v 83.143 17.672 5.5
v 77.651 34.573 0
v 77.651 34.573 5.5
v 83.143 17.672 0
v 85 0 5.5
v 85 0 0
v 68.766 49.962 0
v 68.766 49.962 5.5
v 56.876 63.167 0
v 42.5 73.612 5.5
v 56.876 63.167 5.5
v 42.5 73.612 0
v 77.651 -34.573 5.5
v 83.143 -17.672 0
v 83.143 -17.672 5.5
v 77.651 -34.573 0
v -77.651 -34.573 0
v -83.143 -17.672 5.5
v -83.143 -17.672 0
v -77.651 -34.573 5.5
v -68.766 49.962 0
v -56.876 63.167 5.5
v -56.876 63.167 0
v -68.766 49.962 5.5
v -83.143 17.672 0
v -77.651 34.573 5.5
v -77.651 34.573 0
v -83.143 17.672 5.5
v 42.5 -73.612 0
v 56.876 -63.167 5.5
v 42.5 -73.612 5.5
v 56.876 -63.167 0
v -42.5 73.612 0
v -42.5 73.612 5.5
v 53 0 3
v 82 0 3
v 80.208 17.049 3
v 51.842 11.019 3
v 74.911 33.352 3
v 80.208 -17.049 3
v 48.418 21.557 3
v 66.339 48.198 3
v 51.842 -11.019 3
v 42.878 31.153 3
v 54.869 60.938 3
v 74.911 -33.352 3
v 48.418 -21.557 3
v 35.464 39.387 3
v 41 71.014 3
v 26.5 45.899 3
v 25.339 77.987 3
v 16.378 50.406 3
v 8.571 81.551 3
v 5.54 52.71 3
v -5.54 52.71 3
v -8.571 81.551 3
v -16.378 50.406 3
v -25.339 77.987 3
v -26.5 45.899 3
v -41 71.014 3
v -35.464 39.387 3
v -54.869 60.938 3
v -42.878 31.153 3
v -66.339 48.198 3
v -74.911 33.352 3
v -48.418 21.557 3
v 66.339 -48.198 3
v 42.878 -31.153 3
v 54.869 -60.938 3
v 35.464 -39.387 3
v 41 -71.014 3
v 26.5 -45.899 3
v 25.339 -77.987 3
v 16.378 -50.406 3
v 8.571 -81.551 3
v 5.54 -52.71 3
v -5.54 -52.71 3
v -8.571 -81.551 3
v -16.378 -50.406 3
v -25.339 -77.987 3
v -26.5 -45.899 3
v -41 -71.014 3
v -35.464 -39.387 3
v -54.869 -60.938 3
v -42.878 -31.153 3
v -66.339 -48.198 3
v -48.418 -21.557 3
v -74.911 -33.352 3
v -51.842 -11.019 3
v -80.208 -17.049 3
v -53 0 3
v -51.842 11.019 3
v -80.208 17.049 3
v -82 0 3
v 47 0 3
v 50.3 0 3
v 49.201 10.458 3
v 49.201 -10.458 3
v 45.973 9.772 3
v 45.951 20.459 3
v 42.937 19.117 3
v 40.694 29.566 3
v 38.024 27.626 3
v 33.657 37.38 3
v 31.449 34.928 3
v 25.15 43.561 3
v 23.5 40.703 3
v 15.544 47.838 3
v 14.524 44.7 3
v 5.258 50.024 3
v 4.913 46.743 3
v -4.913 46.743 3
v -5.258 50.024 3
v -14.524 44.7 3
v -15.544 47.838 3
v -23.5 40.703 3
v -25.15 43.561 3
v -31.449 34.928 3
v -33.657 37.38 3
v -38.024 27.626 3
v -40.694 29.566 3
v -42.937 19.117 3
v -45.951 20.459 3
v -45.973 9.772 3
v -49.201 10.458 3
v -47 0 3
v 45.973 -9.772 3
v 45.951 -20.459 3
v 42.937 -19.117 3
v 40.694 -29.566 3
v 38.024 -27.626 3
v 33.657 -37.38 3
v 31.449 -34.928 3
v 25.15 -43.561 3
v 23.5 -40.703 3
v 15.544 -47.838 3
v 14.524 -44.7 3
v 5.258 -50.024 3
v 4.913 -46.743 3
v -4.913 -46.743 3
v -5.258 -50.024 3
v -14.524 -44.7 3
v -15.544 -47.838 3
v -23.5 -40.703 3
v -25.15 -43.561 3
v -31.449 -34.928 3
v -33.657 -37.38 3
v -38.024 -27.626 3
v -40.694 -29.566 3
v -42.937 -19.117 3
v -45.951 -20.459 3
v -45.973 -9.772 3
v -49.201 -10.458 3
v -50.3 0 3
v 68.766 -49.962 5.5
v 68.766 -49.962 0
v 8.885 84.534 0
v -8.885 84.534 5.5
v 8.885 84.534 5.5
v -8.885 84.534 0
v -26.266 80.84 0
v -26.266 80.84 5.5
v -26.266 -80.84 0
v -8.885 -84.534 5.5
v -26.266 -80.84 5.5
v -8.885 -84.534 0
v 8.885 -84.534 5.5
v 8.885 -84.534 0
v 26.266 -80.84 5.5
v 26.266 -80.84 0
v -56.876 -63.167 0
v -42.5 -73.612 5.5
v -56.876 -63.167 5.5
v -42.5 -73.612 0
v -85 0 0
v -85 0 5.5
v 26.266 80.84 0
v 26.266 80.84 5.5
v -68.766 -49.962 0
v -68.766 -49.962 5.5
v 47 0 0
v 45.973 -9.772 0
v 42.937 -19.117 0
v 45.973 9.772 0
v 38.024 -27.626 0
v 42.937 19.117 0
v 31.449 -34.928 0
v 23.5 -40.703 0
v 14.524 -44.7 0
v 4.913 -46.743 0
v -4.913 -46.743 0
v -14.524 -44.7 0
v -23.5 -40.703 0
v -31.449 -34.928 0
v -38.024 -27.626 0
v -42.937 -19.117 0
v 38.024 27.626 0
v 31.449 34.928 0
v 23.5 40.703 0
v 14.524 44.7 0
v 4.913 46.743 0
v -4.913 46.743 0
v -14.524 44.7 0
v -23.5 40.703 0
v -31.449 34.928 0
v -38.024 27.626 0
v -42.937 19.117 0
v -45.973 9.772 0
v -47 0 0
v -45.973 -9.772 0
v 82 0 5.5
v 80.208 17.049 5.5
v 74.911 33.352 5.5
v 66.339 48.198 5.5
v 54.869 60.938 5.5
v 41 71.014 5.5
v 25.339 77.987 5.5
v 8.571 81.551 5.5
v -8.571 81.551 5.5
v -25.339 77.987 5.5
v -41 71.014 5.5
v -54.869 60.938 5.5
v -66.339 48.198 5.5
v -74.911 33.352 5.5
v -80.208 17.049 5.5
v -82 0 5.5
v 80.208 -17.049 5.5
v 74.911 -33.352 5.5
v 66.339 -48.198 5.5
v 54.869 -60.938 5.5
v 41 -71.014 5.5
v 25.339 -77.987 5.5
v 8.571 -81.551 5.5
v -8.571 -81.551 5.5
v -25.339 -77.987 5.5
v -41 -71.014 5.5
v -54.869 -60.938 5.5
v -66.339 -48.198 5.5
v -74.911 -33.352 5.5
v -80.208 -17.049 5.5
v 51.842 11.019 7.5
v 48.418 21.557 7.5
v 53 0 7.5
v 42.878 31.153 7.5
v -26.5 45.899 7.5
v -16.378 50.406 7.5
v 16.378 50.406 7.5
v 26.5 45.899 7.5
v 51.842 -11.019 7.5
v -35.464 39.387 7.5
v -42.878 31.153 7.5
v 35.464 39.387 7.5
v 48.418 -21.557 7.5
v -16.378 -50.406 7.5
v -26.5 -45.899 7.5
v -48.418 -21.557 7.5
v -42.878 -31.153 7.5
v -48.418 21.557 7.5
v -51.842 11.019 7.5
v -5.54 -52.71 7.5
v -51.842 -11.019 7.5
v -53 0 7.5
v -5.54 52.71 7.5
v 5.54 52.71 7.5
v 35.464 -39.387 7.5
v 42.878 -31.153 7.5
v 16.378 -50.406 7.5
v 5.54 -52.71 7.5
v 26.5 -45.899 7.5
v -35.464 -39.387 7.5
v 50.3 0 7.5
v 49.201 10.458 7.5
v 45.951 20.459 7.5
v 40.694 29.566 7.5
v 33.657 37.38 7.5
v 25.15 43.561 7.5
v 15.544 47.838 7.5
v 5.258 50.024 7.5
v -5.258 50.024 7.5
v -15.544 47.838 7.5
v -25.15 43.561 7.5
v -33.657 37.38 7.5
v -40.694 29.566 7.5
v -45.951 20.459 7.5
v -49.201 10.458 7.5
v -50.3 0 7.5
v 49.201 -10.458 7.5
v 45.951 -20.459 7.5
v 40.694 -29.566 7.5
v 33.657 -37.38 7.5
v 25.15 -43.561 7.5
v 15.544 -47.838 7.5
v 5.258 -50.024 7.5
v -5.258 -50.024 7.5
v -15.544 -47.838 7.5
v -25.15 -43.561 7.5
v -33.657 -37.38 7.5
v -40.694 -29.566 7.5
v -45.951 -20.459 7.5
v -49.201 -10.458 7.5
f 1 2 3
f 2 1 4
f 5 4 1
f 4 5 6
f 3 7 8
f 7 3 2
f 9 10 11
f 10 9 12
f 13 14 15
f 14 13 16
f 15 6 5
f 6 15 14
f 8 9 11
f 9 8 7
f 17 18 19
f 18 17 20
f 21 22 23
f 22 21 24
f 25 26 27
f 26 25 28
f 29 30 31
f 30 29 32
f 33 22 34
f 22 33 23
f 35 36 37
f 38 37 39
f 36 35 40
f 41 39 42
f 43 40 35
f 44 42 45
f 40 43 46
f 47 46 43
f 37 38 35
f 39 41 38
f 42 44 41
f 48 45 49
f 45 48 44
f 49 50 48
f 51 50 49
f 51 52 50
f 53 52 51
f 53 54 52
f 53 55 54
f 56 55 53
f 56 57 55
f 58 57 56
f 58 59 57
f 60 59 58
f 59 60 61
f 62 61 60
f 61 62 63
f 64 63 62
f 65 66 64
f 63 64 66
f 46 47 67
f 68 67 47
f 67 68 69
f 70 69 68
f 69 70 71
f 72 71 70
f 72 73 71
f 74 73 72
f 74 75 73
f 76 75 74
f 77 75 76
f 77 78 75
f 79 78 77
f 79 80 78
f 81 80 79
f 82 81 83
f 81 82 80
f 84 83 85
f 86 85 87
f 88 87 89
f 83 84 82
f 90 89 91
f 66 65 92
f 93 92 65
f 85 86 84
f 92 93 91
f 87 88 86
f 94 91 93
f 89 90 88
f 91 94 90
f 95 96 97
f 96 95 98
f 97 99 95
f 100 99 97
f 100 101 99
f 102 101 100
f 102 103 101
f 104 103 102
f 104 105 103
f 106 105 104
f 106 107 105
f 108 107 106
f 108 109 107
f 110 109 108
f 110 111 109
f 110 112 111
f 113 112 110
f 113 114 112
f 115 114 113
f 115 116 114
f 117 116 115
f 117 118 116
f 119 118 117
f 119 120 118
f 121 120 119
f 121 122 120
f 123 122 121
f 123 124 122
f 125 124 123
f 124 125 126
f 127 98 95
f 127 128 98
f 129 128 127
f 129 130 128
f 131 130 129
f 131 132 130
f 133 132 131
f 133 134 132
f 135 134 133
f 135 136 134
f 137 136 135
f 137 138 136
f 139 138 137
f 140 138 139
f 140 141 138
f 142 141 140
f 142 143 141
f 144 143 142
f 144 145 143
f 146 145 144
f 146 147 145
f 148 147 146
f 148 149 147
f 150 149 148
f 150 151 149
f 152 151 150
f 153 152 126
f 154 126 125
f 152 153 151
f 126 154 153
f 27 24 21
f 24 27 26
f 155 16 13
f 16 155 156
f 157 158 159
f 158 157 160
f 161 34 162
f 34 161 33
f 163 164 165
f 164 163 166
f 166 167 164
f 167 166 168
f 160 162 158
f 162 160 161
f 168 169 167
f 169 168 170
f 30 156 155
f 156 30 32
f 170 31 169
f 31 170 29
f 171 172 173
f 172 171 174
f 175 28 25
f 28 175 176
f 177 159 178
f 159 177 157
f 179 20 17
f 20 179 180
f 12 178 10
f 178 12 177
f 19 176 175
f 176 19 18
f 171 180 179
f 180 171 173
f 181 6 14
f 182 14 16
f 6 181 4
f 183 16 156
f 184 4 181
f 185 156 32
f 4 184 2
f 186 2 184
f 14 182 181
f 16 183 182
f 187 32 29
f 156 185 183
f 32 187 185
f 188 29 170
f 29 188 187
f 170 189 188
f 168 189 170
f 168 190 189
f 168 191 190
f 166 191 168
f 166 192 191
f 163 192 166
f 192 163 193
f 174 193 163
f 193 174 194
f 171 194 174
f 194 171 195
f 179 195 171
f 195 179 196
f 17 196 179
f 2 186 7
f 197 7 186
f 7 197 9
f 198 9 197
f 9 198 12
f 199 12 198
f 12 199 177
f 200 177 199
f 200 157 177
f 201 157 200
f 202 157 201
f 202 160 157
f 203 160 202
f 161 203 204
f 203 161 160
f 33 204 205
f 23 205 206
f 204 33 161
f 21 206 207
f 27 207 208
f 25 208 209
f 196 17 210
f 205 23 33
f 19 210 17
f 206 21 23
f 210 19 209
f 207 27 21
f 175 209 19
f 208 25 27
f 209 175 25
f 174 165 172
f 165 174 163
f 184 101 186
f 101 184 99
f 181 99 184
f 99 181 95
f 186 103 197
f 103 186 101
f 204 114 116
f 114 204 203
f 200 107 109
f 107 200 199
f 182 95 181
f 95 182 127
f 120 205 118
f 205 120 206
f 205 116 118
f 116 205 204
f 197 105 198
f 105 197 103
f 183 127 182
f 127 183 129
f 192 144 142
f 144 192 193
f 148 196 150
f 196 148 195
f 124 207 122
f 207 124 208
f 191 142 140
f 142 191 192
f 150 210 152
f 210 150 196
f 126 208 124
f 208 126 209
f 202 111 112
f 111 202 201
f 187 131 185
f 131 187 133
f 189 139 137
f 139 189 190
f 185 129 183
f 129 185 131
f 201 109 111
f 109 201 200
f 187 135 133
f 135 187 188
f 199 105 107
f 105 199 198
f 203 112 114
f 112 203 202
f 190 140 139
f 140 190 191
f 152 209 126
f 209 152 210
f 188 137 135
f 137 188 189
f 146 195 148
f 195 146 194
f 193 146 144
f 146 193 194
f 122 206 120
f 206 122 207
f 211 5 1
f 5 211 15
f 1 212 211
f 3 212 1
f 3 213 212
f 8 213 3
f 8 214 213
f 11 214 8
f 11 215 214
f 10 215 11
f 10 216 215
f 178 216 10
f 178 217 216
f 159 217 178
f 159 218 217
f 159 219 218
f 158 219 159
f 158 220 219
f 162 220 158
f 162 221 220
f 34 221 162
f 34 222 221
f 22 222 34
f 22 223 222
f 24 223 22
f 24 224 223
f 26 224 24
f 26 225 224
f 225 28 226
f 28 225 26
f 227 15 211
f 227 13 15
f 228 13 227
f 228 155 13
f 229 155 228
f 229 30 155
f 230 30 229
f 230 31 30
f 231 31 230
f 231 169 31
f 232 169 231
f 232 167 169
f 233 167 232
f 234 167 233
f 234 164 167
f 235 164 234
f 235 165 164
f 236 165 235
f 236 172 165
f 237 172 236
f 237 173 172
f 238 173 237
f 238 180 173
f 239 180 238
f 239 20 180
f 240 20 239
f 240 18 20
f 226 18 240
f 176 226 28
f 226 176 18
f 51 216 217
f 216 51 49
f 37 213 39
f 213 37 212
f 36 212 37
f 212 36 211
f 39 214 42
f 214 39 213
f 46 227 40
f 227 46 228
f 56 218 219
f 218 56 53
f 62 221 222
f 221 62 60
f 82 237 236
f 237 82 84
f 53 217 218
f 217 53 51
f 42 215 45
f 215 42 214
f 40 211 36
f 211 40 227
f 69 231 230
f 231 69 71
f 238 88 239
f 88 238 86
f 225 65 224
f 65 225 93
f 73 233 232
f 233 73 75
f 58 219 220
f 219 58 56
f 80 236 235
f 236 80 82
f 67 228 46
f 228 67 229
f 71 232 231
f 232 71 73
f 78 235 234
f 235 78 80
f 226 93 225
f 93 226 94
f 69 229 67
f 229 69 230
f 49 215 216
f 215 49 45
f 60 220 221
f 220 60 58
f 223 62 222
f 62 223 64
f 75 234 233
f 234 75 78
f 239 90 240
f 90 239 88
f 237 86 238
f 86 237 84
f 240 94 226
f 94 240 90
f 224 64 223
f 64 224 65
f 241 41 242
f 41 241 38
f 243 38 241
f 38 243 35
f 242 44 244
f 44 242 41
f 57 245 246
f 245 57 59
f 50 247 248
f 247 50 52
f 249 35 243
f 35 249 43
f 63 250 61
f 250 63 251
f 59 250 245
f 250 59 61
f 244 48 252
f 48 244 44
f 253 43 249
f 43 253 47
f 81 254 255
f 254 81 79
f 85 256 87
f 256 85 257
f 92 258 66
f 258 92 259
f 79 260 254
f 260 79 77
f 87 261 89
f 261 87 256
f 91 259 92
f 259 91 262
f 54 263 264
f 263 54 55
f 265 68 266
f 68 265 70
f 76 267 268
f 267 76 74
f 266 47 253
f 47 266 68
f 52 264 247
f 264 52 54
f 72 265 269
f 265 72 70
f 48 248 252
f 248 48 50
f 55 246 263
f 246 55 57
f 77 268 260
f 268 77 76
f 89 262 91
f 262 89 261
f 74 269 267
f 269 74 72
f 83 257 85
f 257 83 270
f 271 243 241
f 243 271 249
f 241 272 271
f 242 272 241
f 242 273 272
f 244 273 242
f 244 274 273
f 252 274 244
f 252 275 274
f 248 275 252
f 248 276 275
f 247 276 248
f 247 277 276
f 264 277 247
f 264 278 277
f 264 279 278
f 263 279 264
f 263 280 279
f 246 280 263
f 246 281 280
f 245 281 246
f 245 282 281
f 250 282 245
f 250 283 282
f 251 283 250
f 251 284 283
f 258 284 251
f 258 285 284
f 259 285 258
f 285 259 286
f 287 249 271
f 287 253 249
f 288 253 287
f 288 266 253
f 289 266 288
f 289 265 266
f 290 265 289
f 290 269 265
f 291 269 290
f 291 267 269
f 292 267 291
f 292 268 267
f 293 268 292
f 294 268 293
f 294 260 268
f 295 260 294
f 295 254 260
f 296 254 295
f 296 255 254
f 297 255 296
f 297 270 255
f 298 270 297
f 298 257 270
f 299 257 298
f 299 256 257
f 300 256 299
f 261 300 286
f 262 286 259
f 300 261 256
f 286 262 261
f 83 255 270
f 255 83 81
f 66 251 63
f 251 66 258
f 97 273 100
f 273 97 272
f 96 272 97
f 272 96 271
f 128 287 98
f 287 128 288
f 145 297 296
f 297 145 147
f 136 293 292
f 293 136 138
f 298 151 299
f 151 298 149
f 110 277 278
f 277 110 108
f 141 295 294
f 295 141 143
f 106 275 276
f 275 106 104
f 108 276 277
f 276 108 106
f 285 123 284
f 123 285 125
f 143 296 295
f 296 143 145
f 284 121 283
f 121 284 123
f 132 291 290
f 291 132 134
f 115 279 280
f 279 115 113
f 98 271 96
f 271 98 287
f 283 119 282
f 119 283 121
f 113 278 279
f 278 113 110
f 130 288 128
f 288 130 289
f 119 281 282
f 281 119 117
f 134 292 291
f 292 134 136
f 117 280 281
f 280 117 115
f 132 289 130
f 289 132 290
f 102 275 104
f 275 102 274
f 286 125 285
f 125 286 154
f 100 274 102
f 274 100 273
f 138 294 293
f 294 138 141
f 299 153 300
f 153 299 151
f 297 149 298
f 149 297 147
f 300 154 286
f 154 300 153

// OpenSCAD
//disc
translate([0,0,1.5])
difference() {
    cylinder(r=85, h=3, center=true); 
    cylinder(r=47, h=3, center=true);
}

//perem
translate([0,0,4])
difference() {
    cylinder(r=85, h=3, center=true); 
    cylinder(r=82, h=3, center=true);
}


//flacs
translate([0,0,5])
difference() {
    cylinder(r=53, h=5, center=true); 
    cylinder(r=50.3, h=5, center=true);
}

/*
translate([0,0,27.5])
difference() {

    cylinder(r=50, h=60, center=true);
    cylinder(r=45, h=60, center=true);
        }
*/
